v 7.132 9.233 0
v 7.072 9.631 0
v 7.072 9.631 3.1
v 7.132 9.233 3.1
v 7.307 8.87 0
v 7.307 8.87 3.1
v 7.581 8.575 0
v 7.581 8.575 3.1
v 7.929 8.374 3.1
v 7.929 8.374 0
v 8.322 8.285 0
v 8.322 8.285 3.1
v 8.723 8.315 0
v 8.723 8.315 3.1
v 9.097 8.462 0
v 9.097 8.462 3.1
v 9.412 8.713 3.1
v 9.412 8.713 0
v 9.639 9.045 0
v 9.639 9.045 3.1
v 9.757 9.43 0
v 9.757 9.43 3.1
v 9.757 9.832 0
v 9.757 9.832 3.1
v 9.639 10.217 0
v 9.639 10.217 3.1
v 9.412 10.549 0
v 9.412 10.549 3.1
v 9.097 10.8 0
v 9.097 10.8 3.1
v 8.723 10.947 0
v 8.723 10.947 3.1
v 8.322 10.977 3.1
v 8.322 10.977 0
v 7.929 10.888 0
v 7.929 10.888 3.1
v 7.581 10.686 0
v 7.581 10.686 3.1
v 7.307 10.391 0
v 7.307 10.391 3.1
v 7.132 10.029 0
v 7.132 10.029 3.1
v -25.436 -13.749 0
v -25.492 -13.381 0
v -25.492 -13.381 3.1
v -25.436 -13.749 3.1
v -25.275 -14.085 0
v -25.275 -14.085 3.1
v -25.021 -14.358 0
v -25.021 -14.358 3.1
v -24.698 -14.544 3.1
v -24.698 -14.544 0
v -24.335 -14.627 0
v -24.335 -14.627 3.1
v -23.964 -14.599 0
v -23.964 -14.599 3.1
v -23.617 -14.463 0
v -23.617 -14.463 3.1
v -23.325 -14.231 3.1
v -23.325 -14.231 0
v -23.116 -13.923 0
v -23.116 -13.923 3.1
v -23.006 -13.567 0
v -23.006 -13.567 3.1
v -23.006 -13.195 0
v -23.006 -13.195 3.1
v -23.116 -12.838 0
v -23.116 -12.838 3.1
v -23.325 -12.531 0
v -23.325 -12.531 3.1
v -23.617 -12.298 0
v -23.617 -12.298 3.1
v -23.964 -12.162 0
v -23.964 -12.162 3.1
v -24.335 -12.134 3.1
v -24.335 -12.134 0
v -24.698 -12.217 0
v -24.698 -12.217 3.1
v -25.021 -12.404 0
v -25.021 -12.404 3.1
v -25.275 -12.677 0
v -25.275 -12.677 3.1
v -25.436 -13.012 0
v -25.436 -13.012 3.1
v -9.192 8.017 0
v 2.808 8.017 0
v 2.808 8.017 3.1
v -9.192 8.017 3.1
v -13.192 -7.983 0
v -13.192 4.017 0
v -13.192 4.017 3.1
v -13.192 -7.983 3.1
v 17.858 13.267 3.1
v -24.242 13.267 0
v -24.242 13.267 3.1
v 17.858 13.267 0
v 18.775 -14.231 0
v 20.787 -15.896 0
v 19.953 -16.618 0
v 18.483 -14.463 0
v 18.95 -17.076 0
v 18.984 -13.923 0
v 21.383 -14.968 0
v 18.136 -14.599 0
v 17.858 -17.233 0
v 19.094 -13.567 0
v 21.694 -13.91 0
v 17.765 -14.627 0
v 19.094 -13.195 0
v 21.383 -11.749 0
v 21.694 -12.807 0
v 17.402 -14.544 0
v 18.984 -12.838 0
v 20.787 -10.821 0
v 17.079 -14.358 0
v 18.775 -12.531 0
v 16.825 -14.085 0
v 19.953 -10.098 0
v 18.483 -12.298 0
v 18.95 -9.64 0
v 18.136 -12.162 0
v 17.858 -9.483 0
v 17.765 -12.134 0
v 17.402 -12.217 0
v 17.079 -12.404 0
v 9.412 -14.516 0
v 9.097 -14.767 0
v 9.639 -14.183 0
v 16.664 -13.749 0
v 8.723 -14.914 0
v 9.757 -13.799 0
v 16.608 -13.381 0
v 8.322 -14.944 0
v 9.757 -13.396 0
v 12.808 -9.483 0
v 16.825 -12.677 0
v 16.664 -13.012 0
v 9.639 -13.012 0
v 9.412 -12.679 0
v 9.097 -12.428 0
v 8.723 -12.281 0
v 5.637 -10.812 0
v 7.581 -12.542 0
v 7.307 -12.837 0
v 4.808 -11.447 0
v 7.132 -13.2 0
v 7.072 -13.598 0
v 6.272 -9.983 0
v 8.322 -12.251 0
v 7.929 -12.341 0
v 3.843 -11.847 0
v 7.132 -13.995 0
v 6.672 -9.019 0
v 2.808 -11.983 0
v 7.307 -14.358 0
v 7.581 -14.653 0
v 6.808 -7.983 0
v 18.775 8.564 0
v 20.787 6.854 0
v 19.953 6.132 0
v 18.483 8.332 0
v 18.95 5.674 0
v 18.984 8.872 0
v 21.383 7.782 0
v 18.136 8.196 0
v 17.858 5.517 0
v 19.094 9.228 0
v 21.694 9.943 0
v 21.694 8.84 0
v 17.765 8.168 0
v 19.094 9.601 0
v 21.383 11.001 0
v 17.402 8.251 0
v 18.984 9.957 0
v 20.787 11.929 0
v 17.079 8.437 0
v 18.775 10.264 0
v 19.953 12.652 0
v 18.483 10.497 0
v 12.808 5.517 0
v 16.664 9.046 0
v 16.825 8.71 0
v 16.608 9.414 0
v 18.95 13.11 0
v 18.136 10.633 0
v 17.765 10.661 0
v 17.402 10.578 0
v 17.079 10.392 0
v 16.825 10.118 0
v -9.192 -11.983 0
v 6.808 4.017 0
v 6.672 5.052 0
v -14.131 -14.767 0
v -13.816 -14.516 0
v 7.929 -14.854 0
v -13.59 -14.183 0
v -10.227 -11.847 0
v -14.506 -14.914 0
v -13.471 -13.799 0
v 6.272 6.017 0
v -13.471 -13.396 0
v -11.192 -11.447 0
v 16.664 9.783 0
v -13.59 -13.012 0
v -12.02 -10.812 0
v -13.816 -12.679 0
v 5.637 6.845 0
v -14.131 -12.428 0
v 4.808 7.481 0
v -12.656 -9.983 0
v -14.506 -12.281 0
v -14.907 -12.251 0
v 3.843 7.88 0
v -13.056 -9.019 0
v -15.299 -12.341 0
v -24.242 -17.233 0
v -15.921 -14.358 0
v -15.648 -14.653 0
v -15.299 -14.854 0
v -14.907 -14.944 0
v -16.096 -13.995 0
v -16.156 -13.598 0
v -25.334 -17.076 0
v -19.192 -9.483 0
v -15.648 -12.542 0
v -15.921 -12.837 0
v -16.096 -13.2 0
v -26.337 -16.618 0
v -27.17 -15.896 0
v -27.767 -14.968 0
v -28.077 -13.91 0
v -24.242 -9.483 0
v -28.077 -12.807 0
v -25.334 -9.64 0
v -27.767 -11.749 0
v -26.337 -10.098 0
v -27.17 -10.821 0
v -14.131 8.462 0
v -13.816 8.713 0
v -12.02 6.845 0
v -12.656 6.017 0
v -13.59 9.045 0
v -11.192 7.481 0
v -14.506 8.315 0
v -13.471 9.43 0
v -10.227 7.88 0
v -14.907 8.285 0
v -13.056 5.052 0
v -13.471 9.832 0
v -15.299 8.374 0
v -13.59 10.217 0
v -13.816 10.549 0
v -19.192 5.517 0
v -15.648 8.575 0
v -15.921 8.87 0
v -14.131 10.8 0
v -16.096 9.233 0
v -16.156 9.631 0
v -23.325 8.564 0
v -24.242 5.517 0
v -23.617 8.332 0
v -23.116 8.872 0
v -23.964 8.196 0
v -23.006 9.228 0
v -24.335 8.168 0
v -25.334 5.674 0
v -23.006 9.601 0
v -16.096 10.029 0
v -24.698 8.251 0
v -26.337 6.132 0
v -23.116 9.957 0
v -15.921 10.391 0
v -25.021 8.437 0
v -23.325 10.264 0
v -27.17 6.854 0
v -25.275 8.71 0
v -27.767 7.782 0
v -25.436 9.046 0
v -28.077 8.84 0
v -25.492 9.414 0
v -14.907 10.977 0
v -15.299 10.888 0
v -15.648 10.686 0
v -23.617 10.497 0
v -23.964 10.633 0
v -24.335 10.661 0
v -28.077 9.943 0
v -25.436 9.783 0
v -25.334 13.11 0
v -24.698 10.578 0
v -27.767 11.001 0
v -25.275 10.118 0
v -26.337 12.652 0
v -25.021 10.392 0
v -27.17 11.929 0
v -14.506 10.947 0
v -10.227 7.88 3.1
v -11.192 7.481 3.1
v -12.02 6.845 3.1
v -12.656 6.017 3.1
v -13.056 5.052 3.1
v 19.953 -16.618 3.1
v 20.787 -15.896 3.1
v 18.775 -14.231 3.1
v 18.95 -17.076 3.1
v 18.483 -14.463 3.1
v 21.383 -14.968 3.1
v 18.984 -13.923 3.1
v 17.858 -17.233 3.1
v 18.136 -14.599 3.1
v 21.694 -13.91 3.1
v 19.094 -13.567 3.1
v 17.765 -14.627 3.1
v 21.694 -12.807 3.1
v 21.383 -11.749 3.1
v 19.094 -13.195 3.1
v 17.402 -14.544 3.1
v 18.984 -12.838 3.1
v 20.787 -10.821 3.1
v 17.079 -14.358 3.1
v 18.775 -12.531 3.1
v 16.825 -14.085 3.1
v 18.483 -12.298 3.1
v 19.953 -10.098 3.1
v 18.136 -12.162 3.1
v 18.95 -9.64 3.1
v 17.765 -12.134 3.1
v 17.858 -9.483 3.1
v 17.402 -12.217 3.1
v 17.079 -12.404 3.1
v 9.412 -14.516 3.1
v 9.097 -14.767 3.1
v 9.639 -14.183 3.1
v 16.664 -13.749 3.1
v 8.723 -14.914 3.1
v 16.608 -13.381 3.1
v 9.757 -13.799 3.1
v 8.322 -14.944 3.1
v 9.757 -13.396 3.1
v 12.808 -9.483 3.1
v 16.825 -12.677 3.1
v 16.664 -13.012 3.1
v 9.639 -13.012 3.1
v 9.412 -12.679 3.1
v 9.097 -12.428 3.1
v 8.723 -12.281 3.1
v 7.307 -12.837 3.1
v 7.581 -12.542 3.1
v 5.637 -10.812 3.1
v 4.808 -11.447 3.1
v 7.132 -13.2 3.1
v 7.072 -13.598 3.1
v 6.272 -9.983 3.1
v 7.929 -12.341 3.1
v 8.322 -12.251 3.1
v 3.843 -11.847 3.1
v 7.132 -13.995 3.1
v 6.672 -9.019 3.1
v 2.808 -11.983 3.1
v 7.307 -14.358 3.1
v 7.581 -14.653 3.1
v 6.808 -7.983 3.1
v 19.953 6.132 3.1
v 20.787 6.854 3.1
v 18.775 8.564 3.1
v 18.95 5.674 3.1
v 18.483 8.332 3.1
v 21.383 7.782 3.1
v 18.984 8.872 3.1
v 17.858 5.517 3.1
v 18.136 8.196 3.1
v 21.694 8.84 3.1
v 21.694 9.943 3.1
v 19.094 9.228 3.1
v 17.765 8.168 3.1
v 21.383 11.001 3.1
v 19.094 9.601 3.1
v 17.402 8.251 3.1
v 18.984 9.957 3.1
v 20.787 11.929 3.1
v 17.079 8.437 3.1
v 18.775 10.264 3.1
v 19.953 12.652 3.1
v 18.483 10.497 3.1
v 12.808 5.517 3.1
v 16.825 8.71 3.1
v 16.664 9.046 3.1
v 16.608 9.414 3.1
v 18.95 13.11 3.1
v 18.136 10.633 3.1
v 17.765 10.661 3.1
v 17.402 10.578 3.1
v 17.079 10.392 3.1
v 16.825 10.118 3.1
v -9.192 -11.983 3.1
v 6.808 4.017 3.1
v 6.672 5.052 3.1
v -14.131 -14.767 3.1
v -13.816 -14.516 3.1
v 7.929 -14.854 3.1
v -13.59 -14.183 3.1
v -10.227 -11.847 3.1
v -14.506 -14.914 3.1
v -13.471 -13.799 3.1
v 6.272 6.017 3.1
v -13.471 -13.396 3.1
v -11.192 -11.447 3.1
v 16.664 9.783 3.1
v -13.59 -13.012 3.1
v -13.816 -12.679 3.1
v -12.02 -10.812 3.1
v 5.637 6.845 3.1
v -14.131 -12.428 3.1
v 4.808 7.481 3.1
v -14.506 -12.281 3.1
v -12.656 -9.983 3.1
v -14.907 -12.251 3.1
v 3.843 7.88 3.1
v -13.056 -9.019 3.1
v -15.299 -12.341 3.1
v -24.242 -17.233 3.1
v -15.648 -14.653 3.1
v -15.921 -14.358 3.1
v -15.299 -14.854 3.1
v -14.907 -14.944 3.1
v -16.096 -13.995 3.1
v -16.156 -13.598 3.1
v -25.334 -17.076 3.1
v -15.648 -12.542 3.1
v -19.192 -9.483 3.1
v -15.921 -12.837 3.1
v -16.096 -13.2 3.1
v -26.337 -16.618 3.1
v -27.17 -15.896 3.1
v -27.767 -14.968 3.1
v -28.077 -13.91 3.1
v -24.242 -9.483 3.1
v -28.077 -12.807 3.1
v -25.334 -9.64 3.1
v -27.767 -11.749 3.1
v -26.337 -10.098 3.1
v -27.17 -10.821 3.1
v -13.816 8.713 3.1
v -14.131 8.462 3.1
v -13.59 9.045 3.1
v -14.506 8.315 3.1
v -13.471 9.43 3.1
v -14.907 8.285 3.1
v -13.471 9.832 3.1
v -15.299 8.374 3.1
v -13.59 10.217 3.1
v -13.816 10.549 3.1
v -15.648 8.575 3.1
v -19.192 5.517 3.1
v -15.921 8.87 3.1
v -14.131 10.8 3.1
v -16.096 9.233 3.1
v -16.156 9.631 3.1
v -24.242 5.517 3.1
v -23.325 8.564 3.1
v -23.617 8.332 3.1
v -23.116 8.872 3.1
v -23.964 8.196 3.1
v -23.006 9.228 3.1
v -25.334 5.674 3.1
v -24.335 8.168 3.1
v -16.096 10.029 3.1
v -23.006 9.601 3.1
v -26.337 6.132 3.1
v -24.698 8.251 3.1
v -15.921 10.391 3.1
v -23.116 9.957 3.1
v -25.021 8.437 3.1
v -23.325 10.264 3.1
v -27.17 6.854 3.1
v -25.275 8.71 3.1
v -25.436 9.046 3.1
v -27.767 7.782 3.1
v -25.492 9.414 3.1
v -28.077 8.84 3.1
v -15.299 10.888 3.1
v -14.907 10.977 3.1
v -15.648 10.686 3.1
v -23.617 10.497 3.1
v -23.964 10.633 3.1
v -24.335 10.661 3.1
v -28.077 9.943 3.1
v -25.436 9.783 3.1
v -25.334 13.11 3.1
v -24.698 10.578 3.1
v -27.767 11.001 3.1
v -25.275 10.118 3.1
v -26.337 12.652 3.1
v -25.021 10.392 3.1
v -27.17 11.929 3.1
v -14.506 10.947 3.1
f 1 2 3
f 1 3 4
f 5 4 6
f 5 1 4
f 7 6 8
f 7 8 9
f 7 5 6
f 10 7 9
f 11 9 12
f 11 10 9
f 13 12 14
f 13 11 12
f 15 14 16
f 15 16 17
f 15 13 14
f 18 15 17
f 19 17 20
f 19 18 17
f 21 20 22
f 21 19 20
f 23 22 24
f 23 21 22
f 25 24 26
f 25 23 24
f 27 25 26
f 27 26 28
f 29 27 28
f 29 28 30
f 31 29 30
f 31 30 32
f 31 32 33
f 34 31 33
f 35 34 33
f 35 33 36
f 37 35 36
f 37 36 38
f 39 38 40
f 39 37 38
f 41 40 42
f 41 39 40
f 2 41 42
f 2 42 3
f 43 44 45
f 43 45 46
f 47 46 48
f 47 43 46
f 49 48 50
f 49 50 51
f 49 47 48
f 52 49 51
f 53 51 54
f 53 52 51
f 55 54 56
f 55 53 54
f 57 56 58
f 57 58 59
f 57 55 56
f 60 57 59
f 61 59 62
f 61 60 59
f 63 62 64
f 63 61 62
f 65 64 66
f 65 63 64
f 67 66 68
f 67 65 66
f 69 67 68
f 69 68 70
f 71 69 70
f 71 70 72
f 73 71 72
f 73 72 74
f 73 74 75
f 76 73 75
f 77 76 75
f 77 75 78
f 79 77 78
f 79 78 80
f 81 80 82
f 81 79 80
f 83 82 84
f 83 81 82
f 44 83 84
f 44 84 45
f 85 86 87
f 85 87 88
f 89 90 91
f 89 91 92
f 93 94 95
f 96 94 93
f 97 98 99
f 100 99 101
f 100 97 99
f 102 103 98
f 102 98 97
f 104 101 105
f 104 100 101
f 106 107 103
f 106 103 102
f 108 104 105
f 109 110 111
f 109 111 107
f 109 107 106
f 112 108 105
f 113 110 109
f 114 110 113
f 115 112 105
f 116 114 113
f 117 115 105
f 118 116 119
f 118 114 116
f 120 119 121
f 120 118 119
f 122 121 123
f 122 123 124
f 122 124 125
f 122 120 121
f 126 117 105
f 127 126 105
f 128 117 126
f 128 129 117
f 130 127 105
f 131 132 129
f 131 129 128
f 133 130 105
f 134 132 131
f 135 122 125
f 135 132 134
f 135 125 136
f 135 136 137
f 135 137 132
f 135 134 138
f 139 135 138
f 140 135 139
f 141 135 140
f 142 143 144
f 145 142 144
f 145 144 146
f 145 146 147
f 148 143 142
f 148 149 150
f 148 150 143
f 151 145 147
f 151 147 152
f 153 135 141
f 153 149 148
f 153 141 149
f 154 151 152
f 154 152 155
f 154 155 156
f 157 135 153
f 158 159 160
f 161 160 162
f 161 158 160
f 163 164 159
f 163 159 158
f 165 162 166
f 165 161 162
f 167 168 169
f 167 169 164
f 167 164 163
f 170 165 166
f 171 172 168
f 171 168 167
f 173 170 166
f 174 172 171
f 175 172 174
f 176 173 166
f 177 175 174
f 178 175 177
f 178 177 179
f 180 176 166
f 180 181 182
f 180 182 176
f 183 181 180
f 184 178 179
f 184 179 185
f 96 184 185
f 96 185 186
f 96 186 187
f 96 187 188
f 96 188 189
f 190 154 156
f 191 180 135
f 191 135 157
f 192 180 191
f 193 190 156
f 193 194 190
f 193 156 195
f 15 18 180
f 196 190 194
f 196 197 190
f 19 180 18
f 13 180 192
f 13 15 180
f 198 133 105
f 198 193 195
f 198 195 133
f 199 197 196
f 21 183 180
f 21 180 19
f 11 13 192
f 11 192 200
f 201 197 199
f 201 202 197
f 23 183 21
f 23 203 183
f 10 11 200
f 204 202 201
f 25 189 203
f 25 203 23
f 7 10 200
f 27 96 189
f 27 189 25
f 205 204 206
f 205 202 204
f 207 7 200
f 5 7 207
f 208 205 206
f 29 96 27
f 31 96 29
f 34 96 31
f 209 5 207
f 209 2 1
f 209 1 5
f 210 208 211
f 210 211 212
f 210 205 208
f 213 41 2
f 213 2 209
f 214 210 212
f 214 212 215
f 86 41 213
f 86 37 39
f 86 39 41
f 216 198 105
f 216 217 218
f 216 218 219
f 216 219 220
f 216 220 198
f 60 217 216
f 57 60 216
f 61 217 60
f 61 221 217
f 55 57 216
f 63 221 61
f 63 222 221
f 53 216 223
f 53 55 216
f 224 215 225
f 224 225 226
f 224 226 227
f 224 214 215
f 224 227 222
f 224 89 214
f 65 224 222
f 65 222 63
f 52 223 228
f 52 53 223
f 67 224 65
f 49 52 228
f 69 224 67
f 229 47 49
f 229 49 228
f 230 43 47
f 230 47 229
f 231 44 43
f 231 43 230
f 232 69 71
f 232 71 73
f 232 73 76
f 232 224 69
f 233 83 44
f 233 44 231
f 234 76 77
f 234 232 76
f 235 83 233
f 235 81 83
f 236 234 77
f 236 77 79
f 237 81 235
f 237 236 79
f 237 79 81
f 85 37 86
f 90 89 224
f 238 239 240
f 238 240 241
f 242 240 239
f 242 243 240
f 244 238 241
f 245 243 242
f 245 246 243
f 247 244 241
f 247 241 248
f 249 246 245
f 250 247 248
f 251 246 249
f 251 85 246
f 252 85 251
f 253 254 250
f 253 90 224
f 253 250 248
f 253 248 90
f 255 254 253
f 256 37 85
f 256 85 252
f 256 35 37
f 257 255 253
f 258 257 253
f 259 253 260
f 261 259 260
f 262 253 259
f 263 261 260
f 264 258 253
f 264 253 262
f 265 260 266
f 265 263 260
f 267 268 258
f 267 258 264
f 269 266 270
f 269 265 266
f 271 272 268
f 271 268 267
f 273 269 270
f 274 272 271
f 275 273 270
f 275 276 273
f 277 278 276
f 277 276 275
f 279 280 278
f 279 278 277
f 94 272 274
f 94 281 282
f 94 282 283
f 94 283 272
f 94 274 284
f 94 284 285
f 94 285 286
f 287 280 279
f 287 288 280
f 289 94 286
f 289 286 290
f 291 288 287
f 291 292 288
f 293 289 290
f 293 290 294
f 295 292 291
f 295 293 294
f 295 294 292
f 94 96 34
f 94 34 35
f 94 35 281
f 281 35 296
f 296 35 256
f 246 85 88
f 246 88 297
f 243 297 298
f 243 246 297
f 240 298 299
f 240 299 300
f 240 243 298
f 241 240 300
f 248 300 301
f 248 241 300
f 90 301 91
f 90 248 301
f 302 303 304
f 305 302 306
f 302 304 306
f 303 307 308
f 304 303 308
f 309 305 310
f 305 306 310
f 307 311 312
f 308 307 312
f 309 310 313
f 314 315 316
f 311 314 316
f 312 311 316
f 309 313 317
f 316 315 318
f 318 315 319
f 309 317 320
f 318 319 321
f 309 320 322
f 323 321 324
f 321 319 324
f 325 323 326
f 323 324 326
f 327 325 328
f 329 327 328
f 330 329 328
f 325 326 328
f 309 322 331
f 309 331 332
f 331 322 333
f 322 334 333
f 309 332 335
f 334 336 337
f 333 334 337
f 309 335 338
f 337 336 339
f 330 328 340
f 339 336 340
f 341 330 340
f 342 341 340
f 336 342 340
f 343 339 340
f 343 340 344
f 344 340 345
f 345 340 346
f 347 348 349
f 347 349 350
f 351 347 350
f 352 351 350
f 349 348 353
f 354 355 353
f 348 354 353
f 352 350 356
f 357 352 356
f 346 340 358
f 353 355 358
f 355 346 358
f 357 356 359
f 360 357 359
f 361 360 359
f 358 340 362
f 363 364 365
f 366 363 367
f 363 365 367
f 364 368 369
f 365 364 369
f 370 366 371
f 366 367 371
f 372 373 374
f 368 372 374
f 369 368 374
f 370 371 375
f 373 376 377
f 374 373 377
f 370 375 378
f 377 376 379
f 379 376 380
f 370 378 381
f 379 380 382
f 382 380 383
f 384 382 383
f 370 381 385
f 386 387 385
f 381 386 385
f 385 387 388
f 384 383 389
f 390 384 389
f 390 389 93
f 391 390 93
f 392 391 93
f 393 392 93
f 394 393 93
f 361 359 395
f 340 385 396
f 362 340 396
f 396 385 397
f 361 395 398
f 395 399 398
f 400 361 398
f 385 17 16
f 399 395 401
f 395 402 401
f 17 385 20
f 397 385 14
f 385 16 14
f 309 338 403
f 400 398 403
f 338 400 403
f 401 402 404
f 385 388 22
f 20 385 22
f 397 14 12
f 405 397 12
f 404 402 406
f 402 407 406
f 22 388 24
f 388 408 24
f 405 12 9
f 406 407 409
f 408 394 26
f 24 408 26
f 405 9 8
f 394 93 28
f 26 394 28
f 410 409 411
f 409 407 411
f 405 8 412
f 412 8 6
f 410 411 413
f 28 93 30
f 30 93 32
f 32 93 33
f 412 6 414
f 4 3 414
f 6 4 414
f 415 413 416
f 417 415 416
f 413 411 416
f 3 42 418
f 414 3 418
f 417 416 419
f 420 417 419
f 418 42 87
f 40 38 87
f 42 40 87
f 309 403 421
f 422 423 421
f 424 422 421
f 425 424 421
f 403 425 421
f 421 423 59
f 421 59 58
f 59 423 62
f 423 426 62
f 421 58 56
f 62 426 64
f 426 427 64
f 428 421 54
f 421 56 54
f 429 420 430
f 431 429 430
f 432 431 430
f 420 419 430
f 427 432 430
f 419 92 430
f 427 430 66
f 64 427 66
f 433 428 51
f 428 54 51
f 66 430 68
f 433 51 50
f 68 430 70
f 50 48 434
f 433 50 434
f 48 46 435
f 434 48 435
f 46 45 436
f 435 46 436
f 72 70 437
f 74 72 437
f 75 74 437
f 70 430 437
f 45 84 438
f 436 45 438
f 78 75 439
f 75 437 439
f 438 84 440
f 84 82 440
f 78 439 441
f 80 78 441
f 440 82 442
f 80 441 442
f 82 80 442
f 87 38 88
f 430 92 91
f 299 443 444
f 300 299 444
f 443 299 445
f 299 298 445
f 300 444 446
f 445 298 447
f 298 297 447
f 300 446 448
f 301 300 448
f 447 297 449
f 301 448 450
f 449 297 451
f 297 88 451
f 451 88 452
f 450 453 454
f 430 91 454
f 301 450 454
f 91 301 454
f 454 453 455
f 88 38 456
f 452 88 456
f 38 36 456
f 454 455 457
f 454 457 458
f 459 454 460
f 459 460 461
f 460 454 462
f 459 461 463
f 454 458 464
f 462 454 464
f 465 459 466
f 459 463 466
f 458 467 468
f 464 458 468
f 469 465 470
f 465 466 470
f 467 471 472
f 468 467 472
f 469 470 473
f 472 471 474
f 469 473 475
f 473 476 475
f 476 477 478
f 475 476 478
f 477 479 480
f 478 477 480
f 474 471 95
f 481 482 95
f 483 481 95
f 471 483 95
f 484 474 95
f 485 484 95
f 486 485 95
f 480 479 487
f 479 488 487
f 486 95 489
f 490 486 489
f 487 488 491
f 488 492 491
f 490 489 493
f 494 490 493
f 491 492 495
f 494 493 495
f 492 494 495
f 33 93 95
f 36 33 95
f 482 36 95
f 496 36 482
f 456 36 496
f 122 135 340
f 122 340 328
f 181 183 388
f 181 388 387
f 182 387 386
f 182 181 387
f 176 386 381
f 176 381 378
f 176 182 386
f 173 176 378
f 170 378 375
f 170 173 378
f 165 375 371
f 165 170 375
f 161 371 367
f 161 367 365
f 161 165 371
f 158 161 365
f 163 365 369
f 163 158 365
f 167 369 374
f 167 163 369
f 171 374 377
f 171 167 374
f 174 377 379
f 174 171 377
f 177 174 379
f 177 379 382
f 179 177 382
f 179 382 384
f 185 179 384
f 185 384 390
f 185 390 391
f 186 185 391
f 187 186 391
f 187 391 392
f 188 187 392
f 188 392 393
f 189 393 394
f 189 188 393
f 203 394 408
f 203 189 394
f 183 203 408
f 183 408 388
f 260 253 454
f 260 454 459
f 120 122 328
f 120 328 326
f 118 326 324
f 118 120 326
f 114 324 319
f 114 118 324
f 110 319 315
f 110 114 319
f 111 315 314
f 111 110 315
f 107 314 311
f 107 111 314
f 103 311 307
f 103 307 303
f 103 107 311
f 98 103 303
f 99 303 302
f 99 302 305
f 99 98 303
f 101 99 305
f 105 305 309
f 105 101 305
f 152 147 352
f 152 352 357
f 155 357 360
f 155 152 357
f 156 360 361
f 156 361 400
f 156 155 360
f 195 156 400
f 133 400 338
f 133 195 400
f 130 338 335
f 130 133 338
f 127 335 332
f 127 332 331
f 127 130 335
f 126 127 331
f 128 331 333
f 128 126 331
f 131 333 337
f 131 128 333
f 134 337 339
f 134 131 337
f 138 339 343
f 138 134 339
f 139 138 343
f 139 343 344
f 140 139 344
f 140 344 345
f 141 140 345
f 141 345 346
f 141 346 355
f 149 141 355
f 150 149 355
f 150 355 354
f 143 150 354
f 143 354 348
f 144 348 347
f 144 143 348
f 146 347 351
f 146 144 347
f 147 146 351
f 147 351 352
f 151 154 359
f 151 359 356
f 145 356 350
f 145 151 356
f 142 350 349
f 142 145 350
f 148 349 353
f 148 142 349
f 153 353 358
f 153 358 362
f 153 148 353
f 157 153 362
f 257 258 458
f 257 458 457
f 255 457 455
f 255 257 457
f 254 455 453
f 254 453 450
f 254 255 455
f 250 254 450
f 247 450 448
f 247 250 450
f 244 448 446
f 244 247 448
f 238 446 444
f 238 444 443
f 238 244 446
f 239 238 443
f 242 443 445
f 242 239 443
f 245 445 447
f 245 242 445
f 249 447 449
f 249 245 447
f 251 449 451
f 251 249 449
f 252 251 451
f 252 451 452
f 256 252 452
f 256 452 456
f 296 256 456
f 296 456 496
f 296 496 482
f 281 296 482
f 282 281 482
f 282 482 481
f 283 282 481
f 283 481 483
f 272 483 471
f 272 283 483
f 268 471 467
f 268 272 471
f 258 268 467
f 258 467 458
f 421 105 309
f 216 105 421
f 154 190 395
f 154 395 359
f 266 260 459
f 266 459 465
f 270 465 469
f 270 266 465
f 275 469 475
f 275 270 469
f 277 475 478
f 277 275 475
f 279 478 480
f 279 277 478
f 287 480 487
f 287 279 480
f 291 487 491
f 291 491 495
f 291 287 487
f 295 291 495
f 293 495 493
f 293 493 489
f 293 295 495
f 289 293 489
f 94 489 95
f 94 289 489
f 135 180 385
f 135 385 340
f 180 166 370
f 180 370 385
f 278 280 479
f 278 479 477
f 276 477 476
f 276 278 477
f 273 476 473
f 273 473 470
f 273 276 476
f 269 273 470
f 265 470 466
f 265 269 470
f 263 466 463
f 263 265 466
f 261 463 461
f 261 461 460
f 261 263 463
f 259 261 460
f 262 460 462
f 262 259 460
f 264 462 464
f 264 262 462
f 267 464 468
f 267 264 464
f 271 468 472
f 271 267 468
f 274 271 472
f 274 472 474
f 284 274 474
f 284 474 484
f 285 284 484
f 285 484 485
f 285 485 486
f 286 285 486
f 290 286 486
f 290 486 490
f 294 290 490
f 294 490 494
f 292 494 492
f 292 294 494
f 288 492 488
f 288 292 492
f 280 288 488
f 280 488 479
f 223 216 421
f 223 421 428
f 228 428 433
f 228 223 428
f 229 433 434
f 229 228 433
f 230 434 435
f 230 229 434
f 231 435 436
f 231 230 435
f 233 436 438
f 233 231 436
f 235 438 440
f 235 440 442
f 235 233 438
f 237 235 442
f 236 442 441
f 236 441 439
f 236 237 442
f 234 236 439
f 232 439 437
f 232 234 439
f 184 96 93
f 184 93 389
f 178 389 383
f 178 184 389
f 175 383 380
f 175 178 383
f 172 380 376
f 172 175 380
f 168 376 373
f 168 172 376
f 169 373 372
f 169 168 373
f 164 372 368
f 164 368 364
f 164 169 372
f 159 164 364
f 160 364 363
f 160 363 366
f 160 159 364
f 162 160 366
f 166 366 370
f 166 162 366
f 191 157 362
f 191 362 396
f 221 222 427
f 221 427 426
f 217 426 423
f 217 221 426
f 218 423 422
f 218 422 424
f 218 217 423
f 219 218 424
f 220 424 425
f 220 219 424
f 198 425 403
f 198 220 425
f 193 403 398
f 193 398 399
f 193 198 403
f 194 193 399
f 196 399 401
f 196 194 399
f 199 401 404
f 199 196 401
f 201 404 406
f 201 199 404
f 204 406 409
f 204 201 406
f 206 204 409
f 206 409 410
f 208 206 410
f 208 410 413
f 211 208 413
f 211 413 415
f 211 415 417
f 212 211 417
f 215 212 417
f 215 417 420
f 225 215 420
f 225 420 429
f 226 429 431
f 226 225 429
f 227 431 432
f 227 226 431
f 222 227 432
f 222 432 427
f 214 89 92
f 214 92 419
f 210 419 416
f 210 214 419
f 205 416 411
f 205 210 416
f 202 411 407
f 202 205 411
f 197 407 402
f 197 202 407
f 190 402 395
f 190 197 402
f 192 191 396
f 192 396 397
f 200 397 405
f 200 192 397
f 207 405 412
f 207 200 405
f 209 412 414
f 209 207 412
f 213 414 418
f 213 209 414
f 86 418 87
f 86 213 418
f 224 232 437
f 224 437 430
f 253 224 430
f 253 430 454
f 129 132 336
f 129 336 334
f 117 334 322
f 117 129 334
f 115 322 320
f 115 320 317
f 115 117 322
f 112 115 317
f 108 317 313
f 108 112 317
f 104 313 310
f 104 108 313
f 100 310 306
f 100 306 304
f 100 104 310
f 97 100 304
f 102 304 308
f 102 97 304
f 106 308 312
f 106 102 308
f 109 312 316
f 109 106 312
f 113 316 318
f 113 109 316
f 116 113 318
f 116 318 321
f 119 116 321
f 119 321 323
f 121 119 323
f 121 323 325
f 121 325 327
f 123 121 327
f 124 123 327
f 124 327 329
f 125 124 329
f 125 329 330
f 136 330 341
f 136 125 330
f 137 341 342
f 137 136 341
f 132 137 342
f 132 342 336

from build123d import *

# Parameters (mm, degrees)
SKETCH1_R      = 1.35
SKETCH1_R_2    = 1.25
EXTRUDE1_DEPTH = 3.1


with BuildPart() as part:
    # Sketch1 → Extrude1 (new body)
    with BuildSketch(Plane.XY):
        with BuildLine():
            Line((-24.241802054, 13.266728144), (-19.191802054, 13.266728144))
            Line((-19.191802054, 13.266728144), (12.808197946, 13.266728144))
            Line((12.808197946, 13.266728144), (17.858197946, 13.266728144))
            ThreePointArc((17.858197946, 13.266728144), (21.733197946, 9.391728144), (17.858197946, 5.516728144))
            Line((17.858197946, 5.516728144), (12.808197946, 5.516728144))
            Line((12.808197946, 5.516728144), (12.808197946, -9.483271856))
            Line((12.808197946, -9.483271856), (17.858197946, -9.483271856))
            ThreePointArc((17.858197946, -9.483271856), (21.733197946, -13.358271856), (17.858197946, -17.233271856))
            Line((17.858197946, -17.233271856), (12.808197946, -17.233271856))
            Line((12.808197946, -17.233271856), (-19.191802054, -17.233271856))
            Line((-19.191802054, -17.233271856), (-24.241802054, -17.233271856))
            ThreePointArc((-24.241802054, -17.233271856), (-28.116802054, -13.358271856), (-24.241802054, -9.483271856))
            Line((-24.241802054, -9.483271856), (-19.191802054, -9.483271856))
            Line((-19.191802054, -9.483271856), (-19.191802054, 5.516728144))
            Line((-19.191802054, 5.516728144), (-24.241802054, 5.516728144))
            ThreePointArc((-24.241802054, 5.516728144), (-28.116802054, 9.391728144), (-24.241802054, 13.266728144))
        make_face()
        with Locations(Location((-14.806030935, 9.630953317, 0), (0, 0, 180))):
            Circle(SKETCH1_R, mode=Mode.SUBTRACT)
        with Locations(Location((8.422426827, -13.597504445, 0), (0, 0, 180))):
            Circle(SKETCH1_R, mode=Mode.SUBTRACT)
        with Locations(Location((-14.806030935, -13.597504445, 0), (0, 0, 180))):
            Circle(SKETCH1_R, mode=Mode.SUBTRACT)
        with Locations(Location((8.422426827, 9.630953317, 0), (0, 0, 180))):
            Circle(SKETCH1_R, mode=Mode.SUBTRACT)
        with Locations(Location((-24.241802054, 9.414269496, 0), (0, 0, 180))):
            Circle(SKETCH1_R_2, mode=Mode.SUBTRACT)
        with Locations(Location((-24.241802054, -13.380813208, 0), (0, 0, 180))):
            Circle(SKETCH1_R_2, mode=Mode.SUBTRACT)
        with Locations(Location((17.858197946, -13.380813208, 0), (0, 0, 180))):
            Circle(SKETCH1_R_2, mode=Mode.SUBTRACT)
        with Locations(Location((17.858197946, 9.414269496, 0), (0, 0, 180))):
            Circle(SKETCH1_R_2, mode=Mode.SUBTRACT)
        with BuildLine():
            Line((-13.191802054, 4.016724436), (-13.191802054, -7.983275564))
            ThreePointArc((-13.191802054, -7.983275564), (-12.020229179, -10.811702689), (-9.191802054, -11.983275564))
            Line((-9.191802054, -11.983275564), (2.808197946, -11.983275564))
            ThreePointArc((2.808197946, -11.983275564), (5.636625071, -10.811702689), (6.808197946, -7.983275564))
            Line((6.808197946, -7.983275564), (6.808197946, 4.016724436))
            ThreePointArc((6.808197946, 4.016724436), (5.636625071, 6.84515156), (2.808197946, 8.016724436))
            Line((2.808197946, 8.016724436), (-9.191802054, 8.016724436))
            ThreePointArc((-9.191802054, 8.016724436), (-12.020229179, 6.84515156), (-13.191802054, 4.016724436))
        make_face(mode=Mode.SUBTRACT)
    extrude(amount=EXTRUDE1_DEPTH)


solid = part.part
